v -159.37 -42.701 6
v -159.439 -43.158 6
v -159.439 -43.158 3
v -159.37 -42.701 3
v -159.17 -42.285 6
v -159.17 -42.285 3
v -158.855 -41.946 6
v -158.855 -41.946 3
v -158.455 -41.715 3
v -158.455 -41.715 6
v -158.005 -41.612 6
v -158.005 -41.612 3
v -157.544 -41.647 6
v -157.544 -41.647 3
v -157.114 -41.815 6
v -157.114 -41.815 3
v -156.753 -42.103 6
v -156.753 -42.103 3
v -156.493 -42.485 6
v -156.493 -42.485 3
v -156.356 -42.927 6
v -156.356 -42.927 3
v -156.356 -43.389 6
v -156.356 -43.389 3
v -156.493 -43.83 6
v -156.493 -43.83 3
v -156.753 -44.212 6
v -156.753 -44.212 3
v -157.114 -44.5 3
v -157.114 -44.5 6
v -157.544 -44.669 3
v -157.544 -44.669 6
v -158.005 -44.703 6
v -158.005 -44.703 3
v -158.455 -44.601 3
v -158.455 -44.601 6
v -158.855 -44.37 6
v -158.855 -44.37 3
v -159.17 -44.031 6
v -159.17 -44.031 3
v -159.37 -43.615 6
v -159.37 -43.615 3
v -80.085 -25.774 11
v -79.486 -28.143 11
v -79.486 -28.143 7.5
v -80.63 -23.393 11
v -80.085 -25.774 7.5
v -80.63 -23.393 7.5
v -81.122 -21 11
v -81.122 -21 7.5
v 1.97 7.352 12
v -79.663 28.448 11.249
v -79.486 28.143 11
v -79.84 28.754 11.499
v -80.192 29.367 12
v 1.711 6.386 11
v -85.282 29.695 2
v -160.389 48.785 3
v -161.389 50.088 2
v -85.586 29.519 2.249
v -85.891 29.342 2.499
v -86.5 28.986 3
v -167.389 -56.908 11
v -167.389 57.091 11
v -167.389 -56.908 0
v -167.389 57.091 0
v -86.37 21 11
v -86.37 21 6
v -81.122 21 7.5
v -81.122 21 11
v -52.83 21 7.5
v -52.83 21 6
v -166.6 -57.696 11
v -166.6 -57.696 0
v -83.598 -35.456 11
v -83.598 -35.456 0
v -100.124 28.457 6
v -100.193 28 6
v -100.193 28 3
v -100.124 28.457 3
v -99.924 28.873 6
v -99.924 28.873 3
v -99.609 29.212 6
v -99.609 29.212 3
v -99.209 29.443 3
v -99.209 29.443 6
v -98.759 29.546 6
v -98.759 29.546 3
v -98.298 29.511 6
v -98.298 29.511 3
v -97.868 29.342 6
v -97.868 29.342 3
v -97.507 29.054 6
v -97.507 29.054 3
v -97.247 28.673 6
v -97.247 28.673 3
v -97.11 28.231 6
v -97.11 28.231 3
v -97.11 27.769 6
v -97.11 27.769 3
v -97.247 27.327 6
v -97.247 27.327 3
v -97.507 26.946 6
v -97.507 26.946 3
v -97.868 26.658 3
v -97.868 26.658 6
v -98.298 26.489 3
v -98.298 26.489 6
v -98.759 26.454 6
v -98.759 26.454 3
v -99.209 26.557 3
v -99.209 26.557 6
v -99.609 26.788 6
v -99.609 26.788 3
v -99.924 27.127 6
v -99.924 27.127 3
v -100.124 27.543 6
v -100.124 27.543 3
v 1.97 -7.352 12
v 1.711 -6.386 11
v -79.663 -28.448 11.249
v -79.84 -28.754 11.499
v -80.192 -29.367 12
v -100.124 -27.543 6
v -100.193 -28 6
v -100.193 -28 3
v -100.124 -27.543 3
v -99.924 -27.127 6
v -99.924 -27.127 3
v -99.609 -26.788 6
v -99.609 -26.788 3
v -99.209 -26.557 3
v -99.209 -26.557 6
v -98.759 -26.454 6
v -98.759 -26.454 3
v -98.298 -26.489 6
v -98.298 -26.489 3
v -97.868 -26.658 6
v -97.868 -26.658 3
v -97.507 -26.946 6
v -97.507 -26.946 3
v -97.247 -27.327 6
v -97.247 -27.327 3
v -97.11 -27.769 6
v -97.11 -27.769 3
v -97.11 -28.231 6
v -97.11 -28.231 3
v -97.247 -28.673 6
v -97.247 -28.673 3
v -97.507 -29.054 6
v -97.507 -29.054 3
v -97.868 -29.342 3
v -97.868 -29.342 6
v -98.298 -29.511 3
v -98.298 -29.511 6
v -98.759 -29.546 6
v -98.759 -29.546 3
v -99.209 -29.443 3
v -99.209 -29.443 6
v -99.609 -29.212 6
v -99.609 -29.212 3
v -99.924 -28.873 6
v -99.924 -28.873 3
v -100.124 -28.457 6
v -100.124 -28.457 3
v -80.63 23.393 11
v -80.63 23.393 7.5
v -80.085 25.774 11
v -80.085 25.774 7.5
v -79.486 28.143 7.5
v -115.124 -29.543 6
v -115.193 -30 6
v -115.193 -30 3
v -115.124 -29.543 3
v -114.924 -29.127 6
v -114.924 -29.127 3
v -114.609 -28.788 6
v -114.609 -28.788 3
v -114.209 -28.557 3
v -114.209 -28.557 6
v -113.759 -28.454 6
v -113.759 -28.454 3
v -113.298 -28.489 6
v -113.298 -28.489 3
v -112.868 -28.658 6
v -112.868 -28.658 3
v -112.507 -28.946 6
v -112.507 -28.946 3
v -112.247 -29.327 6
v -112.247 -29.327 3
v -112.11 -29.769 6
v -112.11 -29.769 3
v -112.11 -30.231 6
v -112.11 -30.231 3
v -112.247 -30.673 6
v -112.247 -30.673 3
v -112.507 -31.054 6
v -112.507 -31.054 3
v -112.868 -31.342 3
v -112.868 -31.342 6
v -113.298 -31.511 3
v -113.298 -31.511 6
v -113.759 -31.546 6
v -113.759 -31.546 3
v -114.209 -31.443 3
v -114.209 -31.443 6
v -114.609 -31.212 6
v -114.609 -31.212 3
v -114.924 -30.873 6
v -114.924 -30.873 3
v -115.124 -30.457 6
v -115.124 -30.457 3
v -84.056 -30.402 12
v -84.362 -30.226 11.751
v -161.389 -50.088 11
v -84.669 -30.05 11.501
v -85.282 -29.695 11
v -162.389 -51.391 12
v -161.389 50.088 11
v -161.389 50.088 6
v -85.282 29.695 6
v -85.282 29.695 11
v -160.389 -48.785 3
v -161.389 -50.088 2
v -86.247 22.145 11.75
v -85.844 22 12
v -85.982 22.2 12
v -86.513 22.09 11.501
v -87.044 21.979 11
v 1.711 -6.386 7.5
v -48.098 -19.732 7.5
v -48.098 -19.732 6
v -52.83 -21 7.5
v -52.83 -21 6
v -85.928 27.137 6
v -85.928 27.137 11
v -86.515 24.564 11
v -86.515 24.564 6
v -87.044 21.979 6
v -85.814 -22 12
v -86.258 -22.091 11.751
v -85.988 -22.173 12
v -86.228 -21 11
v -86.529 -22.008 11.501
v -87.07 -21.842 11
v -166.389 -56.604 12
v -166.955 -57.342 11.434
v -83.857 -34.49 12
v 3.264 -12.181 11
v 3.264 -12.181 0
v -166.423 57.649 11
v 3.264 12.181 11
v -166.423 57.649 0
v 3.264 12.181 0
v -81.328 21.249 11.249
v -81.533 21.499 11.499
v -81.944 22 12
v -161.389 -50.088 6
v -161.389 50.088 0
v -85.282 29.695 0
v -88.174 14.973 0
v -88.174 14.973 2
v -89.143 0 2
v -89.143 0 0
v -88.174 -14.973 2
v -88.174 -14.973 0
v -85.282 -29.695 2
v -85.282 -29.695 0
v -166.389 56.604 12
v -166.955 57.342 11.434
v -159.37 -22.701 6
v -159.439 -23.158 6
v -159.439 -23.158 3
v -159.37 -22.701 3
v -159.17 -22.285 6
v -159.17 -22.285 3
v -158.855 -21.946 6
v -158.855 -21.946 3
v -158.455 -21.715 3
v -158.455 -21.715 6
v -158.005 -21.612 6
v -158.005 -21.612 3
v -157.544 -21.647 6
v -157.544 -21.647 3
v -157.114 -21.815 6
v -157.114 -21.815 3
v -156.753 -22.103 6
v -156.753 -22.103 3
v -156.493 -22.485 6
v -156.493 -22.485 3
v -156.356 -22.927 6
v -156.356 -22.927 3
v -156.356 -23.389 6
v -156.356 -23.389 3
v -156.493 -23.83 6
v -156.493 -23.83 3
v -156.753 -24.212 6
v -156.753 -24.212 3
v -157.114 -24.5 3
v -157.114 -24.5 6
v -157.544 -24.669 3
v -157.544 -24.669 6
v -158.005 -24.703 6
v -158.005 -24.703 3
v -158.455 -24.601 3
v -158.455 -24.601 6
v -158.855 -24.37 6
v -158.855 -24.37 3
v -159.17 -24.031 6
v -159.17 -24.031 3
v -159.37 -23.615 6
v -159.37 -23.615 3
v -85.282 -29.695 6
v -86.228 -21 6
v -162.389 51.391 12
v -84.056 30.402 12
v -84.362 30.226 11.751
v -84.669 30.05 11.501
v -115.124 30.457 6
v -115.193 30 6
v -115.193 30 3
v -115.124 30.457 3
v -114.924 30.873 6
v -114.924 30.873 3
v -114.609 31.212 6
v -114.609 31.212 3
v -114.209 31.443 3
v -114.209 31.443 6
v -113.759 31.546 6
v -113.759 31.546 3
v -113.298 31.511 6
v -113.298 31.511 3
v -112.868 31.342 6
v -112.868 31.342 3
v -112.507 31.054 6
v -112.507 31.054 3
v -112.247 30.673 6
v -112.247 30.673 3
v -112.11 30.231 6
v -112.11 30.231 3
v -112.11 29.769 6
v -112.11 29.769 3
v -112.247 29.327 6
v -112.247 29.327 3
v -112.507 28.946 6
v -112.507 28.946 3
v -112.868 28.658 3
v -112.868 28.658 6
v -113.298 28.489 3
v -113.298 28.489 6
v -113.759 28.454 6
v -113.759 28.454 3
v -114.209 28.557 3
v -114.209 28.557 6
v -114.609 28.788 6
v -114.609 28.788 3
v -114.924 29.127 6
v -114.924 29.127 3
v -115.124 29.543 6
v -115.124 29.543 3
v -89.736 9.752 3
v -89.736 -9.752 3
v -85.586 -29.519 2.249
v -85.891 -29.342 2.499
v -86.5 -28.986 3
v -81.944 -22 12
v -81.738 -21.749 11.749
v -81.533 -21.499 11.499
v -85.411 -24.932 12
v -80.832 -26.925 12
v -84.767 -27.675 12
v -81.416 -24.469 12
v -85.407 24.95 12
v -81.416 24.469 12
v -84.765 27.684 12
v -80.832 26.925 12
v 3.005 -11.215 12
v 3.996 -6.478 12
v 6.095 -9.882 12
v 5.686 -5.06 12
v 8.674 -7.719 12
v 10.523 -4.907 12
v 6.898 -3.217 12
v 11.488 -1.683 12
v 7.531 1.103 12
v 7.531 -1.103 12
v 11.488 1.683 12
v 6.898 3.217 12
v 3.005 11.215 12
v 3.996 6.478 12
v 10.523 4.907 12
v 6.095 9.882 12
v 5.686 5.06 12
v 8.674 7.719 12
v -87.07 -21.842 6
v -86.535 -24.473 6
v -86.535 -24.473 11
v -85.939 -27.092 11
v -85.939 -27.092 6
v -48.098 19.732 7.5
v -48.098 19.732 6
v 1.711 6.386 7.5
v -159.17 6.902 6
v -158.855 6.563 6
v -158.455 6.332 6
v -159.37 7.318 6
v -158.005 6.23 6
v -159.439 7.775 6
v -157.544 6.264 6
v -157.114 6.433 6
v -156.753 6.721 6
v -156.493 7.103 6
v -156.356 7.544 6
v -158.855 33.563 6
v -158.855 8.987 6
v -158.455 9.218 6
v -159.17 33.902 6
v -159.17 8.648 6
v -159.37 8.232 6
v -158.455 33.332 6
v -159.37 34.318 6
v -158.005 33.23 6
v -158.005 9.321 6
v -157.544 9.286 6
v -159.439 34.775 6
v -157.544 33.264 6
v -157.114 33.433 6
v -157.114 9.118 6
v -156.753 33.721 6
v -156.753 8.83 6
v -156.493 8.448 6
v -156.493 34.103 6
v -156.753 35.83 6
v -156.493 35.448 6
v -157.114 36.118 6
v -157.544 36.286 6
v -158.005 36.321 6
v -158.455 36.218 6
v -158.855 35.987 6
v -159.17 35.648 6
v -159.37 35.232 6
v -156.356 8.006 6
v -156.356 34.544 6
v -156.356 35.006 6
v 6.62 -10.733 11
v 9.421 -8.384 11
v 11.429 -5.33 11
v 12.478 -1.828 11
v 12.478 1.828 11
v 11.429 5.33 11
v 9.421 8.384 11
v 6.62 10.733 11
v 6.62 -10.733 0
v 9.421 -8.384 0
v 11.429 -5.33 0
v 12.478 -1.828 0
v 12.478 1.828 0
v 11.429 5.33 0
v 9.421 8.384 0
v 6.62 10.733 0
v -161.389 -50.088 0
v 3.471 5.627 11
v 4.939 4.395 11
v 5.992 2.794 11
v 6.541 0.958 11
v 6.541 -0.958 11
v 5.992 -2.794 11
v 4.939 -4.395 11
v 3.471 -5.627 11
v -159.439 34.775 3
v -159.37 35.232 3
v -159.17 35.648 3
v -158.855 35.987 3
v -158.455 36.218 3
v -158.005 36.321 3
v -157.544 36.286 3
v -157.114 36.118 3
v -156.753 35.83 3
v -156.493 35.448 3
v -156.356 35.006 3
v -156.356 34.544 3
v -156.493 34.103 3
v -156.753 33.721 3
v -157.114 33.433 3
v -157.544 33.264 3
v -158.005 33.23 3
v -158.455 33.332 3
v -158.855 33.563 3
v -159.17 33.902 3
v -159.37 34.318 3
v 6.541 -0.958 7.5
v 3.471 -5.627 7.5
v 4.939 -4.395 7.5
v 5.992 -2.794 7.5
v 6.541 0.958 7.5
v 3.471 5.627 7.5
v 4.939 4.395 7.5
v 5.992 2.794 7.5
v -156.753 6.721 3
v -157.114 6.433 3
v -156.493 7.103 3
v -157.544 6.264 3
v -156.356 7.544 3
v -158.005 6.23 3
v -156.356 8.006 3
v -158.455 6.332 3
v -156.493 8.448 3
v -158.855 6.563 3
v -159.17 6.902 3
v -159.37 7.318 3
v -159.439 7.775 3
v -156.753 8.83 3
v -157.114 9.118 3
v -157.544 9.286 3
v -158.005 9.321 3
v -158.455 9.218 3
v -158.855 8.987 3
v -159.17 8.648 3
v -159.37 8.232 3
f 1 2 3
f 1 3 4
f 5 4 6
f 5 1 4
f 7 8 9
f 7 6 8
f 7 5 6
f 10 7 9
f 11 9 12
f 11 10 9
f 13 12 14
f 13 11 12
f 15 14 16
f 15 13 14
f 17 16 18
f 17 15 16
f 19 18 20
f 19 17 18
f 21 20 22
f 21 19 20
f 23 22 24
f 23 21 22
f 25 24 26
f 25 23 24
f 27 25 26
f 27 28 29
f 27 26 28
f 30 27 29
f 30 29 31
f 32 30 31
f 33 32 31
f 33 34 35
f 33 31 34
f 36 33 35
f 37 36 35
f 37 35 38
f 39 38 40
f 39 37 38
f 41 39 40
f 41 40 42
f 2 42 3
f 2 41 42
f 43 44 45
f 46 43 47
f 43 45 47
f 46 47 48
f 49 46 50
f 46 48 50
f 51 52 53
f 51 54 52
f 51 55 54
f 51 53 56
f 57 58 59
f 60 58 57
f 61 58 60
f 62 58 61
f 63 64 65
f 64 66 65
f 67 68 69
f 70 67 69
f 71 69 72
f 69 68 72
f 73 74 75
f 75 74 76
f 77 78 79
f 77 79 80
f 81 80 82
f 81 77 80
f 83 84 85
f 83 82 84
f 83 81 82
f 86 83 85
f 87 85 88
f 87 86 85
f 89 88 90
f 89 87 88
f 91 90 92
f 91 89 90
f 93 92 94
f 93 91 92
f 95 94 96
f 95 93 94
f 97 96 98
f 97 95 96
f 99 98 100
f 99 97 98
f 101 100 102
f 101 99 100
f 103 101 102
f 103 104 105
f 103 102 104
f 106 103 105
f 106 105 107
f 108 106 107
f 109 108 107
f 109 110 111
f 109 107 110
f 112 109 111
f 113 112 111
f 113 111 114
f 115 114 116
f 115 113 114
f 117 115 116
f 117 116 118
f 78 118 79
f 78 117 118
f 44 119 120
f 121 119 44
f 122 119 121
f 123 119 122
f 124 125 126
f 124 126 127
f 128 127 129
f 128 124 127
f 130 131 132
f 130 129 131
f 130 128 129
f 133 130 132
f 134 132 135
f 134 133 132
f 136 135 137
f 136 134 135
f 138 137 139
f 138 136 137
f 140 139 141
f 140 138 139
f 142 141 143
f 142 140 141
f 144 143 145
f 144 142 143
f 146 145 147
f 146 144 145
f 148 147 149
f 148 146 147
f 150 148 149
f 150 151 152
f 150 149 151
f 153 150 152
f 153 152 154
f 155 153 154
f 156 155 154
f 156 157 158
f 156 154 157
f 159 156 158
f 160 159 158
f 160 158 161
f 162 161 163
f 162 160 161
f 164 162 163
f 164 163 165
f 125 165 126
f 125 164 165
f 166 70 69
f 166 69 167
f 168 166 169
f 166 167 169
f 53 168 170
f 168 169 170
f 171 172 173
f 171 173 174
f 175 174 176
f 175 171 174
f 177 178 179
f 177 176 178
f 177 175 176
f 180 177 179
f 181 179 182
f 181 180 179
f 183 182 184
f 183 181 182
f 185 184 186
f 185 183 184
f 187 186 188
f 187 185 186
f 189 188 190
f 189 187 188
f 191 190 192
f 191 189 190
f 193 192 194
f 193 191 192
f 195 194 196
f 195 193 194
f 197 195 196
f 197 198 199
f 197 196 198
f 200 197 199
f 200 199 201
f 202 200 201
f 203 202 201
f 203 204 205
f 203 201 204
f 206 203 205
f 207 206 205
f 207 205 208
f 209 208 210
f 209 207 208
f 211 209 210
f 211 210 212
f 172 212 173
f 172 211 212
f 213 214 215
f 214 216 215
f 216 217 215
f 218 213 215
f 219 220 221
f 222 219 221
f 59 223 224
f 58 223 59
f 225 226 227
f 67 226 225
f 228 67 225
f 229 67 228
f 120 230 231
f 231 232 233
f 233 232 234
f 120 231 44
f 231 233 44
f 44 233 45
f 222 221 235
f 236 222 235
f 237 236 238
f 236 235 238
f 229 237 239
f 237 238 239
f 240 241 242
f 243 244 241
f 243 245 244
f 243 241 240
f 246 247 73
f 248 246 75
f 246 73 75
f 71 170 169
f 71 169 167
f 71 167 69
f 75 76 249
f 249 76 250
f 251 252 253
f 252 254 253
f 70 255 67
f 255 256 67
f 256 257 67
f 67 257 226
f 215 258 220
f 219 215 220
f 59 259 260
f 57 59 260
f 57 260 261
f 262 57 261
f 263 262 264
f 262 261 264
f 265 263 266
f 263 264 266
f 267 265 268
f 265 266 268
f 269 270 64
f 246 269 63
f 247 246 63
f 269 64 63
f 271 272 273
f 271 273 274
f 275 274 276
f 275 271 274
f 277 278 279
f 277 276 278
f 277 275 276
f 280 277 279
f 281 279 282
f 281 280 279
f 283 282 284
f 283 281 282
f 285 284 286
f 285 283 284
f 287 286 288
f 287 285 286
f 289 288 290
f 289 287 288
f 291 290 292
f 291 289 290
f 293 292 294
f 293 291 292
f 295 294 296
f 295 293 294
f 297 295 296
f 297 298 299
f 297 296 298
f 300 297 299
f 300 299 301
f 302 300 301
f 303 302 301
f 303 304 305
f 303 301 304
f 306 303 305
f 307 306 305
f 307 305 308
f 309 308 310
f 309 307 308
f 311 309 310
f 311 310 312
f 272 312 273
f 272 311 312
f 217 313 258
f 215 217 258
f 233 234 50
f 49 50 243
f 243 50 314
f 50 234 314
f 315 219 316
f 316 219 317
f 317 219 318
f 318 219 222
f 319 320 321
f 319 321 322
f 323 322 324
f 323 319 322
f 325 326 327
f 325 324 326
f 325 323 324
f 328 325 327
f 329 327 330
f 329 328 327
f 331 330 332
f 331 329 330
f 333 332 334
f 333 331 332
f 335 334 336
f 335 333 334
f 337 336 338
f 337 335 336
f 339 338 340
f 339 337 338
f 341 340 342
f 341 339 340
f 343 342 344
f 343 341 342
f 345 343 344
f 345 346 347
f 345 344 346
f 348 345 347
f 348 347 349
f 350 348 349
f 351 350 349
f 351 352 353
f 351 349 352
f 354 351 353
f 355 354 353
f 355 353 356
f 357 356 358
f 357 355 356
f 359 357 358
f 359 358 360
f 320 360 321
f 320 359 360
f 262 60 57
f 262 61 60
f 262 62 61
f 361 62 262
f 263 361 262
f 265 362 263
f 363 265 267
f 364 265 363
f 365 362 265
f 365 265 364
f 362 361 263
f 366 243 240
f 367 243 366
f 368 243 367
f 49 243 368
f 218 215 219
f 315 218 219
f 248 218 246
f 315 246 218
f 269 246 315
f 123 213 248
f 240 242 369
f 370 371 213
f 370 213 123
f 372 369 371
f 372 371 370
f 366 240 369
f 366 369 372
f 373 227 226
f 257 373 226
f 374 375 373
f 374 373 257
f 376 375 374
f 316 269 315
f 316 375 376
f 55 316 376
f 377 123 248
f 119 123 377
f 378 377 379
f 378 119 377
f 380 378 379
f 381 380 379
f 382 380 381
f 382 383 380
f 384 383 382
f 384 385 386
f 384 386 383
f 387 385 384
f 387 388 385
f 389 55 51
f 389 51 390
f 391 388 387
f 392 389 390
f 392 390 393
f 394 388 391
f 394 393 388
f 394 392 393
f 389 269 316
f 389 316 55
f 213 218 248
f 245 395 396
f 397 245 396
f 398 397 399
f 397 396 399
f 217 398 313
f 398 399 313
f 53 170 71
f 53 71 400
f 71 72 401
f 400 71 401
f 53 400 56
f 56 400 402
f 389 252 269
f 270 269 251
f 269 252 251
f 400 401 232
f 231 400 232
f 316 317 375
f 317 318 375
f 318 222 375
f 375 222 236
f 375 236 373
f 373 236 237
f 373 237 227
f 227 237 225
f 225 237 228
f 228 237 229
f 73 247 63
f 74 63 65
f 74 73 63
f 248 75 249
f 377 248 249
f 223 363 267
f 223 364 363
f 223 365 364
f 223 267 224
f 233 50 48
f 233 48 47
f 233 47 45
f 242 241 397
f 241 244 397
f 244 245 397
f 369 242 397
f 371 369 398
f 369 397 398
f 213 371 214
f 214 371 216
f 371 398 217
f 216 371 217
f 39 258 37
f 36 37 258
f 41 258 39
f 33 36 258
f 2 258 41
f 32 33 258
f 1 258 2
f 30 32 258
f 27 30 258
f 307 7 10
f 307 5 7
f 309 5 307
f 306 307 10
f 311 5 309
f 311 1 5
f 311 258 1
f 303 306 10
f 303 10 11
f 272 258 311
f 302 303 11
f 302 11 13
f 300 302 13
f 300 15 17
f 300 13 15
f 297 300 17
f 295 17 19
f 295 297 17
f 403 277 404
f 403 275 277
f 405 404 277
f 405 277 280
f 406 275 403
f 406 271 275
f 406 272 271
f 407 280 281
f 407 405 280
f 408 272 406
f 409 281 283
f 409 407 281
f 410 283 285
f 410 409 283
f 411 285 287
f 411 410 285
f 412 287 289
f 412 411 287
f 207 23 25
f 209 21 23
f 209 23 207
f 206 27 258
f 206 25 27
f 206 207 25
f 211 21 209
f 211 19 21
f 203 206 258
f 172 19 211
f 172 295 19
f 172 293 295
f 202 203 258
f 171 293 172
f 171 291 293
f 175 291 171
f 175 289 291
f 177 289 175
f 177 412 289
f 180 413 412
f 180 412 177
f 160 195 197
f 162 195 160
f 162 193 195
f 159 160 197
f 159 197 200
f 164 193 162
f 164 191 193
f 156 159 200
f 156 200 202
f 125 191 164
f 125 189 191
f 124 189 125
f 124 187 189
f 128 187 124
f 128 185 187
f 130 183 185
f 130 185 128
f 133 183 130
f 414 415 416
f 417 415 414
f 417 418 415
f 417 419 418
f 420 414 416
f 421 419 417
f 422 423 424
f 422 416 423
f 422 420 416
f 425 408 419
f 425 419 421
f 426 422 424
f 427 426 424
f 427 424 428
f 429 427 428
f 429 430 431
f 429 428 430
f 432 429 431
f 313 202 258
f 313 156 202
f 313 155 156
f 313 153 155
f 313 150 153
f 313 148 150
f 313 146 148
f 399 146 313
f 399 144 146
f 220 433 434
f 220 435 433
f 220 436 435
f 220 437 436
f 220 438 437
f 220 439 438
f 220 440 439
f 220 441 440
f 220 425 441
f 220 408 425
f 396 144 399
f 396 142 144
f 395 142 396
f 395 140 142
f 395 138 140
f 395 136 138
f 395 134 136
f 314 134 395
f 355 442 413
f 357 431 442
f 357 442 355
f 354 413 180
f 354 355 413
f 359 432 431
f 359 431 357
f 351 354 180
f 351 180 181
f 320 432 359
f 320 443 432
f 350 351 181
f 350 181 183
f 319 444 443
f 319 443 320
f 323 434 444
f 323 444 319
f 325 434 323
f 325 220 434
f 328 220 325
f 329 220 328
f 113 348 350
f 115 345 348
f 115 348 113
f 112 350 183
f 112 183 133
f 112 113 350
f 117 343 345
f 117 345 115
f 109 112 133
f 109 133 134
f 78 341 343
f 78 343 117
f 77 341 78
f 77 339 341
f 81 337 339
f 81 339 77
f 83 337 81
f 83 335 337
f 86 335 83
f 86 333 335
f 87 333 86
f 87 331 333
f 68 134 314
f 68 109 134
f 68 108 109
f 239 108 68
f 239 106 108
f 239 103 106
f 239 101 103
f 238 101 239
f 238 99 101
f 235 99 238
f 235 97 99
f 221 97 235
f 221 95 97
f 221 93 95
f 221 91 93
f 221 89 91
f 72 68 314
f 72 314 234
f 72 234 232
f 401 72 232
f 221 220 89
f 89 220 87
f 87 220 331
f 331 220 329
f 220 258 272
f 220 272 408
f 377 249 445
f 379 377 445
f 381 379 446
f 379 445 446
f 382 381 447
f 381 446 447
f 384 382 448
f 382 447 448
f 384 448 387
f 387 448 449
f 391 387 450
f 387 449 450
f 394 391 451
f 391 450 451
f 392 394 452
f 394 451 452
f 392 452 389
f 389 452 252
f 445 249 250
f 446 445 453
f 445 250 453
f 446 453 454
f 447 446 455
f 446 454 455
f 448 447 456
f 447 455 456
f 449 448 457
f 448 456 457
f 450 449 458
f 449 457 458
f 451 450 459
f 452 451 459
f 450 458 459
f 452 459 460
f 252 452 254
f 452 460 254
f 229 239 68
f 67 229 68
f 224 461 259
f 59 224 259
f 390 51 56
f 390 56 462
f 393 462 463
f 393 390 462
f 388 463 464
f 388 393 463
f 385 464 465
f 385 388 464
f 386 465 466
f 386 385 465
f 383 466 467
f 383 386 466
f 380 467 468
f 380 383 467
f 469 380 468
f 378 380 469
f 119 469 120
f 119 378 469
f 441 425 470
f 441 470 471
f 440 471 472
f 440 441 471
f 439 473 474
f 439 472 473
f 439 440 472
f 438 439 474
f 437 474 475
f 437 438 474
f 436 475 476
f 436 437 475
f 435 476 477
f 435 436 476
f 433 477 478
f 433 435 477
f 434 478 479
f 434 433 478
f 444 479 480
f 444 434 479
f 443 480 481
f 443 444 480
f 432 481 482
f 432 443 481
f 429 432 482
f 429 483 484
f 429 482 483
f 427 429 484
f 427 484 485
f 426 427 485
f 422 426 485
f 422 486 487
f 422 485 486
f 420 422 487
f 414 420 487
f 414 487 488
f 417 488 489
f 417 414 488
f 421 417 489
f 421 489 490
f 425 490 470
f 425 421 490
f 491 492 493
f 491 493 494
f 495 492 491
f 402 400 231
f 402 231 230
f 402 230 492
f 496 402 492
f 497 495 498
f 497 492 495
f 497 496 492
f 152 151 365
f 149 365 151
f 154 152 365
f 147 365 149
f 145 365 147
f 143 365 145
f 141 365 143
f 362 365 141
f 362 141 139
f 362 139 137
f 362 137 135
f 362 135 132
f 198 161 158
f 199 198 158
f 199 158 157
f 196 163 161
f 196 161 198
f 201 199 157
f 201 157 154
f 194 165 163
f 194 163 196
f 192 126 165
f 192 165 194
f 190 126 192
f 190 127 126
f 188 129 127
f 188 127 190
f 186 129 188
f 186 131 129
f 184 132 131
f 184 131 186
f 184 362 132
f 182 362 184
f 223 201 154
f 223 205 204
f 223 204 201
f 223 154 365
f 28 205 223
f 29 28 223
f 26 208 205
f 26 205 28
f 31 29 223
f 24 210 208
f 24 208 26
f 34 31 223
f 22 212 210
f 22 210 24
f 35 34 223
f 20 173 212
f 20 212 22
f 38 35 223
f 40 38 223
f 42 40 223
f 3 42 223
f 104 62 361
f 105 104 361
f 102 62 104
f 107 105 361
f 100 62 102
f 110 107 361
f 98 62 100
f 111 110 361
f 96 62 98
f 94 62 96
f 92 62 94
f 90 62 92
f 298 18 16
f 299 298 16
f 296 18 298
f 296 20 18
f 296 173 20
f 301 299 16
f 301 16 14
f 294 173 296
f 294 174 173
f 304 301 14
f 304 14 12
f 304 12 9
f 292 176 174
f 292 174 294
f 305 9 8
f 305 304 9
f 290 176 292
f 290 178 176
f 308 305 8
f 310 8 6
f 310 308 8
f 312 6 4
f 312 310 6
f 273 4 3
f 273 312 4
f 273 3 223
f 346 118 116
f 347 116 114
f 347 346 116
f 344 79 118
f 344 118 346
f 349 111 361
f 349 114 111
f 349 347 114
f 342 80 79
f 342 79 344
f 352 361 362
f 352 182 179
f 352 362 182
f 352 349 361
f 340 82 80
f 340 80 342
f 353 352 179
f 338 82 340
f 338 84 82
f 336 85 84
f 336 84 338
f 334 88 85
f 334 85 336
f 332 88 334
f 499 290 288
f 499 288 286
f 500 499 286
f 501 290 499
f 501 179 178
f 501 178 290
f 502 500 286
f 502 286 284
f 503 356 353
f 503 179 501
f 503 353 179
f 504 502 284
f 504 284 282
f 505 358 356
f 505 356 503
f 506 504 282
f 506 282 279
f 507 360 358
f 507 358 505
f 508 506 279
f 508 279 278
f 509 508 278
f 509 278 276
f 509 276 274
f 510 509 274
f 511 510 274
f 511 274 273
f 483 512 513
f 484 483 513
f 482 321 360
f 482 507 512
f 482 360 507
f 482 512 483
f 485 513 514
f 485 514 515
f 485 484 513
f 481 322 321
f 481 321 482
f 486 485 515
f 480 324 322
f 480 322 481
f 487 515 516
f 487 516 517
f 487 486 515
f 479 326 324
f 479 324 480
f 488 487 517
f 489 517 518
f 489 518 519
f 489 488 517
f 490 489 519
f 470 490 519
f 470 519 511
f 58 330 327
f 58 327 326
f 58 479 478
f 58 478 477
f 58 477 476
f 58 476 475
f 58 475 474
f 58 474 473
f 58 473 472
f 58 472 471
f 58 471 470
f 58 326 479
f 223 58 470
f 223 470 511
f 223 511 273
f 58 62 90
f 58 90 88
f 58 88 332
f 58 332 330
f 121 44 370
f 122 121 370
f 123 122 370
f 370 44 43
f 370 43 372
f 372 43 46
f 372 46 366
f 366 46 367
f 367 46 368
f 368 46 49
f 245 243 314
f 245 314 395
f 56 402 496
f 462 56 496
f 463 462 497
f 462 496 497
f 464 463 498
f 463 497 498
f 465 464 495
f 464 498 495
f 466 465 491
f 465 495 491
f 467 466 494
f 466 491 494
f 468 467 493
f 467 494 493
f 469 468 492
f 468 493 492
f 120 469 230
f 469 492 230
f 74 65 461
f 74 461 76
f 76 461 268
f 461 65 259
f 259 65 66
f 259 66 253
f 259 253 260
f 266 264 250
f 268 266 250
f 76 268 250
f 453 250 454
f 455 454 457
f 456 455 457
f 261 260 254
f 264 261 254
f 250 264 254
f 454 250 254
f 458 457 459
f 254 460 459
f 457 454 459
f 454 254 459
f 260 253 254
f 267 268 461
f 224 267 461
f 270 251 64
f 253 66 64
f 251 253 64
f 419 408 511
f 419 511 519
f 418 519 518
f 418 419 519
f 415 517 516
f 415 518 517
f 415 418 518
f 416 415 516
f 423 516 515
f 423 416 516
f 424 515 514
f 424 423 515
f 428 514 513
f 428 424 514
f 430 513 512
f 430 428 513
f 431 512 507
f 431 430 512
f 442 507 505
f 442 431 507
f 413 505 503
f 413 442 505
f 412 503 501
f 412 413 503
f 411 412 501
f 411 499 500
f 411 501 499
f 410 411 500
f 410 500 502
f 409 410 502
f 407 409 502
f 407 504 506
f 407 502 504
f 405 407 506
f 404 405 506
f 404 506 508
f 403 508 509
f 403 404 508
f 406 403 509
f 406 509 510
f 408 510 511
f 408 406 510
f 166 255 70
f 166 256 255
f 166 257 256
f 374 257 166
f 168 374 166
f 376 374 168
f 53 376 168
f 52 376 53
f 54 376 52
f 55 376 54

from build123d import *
from OCP.BRepFilletAPI import BRepFilletAPI_MakeChamfer

# Parameters (mm, degrees)
BOSS_EXTRUDE1_DEPTH     = 6
BOSS_EXTRUDE2_START     = 6
BOSS_EXTRUDE2_DEPTH     = 6
BOSS_EXTRUDE3_DEPTH     = 1.5
CUT_EXTRUDE3_DEPTH      = 6
CHAMFER1_SIZE           = 0.858848527
CHAMFER1_SIZE_2         = 1
CHAMFER2_SIZE           = 1
CHAMFER3_SIZE           = 1
CHAMFER3_SIZE2          = 0.816496581
CUT_EXTRUDE4_DEPTH      = 3
CHAMFER4_SIZE           = 1
CUT_EXTRUDE5_DEPTH      = 178.282114668
CUT_EXTRUDE5_DEPTH_BACK = 178.282114668
SKETCH8_R               = 1.55


with BuildPart() as part:
    # Sketch3 → Boss-Extrude1 (new body)
    with BuildSketch(Plane.XY):
        with BuildLine():
            Line((3.263957589, 12.181255556), (-167.389036276, 57.907587448))
            Line((-167.389036276, 57.907587448), (-167.389036276, -57.907587448))
            Line((-167.389036276, -57.907587448), (-83.597968128, -35.455838404))
            Line((-83.597968128, -35.455838404), (3.263957589, -12.181255556))
            ThreePointArc((3.263957589, -12.181255556), (12.610963724, 0), (3.263957589, 12.181255556))
        make_face()
    extrude(amount=BOSS_EXTRUDE1_DEPTH)

    # Sketch3<3> → Boss-Extrude2 (add)
    with BuildSketch(Plane.XY.offset(BOSS_EXTRUDE2_START)):
        with BuildLine():
            ThreePointArc((3.263957589, -12.181255556), (12.610963724, 0), (3.263957589, 12.181255556))
            Line((3.263957589, 12.181255556), (-167.389036276, 57.907587448))
            Line((-167.389036276, 57.907587448), (-167.389036276, -57.907587448))
            Line((-167.389036276, -57.907587448), (-83.597968128, -35.455838404))
            Line((-83.597968128, -35.455838404), (3.263957589, -12.181255556))
        make_face()
        with BuildLine():
            Line((1.711043318, -6.385700598), (-79.486479098, -28.142511157))
            ThreePointArc((-79.486479098, -28.142511157), (-83.143036276, 0), (-79.486479098, 28.142511157))
            Line((-79.486479098, 28.142511157), (1.711043318, 6.385700598))
            ThreePointArc((1.711043318, 6.385700598), (6.610963724, 0), (1.711043318, -6.385700598))
        make_face(mode=Mode.SUBTRACT)
        with BuildLine():
            Line((-85.282065581, -29.695433875), (-161.389036276, -50.088235211))
            Line((-161.389036276, -50.088235211), (-161.389036276, 50.088235211))
            Line((-161.389036276, 50.088235211), (-85.282065581, 29.695433875))
            ThreePointArc((-85.282065581, 29.695433875), (-89.143036276, 0), (-85.282065581, -29.695433875))
        make_face(mode=Mode.SUBTRACT)
    extrude(amount=BOSS_EXTRUDE2_DEPTH)

    # Sketch4 → Boss-Extrude3 (add)
    with BuildSketch(Plane.XY.offset(6)):
        with BuildLine():
            ThreePointArc((-79.486479098, 28.142511157), (-80.363791639, 24.584864194), (-81.12226241, 21))
            Line((-81.12226241, 21), (-52.830264568, 21))
            Line((-52.830264568, 21), (-79.486479098, 28.142511157))
        make_face()
        with BuildLine():
            Line((-79.486479098, -28.142511157), (-52.830264568, -21))
            Line((-52.830264568, -21), (-81.12226241, -21))
            ThreePointArc((-81.12226241, -21), (-80.363791639, -24.584864194), (-79.486479098, -28.142511157))
        make_face()
        with BuildLine():
            Line((-48.09821376, 19.732050808), (-48.09821376, -19.732050808))
            Line((-48.09821376, -19.732050808), (1.711043318, -6.385700598))
            ThreePointArc((1.711043318, -6.385700598), (6.610963724, 0), (1.711043318, 6.385700598))
            Line((1.711043318, 6.385700598), (-48.09821376, 19.732050808))
        make_face()
    extrude(amount=BOSS_EXTRUDE3_DEPTH)

    # Sketch5 → Cut-Extrude3 (cut)
    with BuildSketch(Plane.XY.offset(6)):
        with BuildLine():
            Line((-81.12226241, 21), (-87.228470489, 21))
            ThreePointArc((-87.228470489, 21), (-89.143036276, 0), (-87.228470489, -21))
            Line((-87.228470489, -21), (-81.12226241, -21))
            ThreePointArc((-81.12226241, -21), (-83.143036276, 0), (-81.12226241, 21))
        make_face()
    extrude(amount=CUT_EXTRUDE3_DEPTH, mode=Mode.SUBTRACT)

    # Chamfer1
    # the kernel refuses this chamfer: 1, 0.858848527 mm, written as the material it takes off along each edge
    with BuildSketch(Plane(origin=(-87.228470489, 21, 6), x_dir=(0.1850514416549976, 0.9827288354075131, 0), z_dir=(0, 0, 1))) as chamfer1_piece_1:
        with BuildLine():
            Line((0.995740125, 0), (CHAMFER1_SIZE * 0.185051441724, -CHAMFER1_SIZE * 0.982728835776))
            Line((CHAMFER1_SIZE * 0.185051441724, -CHAMFER1_SIZE * 0.982728835776), (0, 0))
            ThreePointArc((0, 0), (0.511949844, 0.001066408), (0.995740125, 0))
        make_face()
    extrude(amount=8.560742024, mode=Mode.SUBTRACT)
    with BuildSketch(Plane(origin=(-87.228470489, -21, 6), x_dir=(1, 0, 0), z_dir=(0, 0, 1))) as chamfer1_piece_2:
        with BuildLine():
            Line((CHAMFER1_SIZE_2, 0), (0.158025015, -0.841974985))
            ThreePointArc((0.158025015, -0.841974985), (0.080319075, -0.432228603), (0, 0))
            Line((0, 0), (CHAMFER1_SIZE_2, 0))
        make_face()
    extrude(amount=8.571682988, mode=Mode.SUBTRACT)

    # Chamfer2
    chamfer2_edges = [part.edges().sort_by_distance(p)[0] for p in [
        (-86.244364999, -25.784214234, 12),
        (-83.67536645, -21, 12),
        (-86.706914653, 21.489271267, 12),
        (-86.649457982, -21.420987493, 12),
        (-82.062539343, -35.044421502, 12),
        (12.610963724, 0, 12),
        (-161.389036276, 0, 12),
        (-86.228906055, 25.852006602, 12),
        (-123.335550929, -39.891834543, 12),
        (-38.88771789, 17.264105877, 12),
        (-38.88771789, -17.264105877, 12),
        (-82.062539343, 35.044421502, 12),
        (-167.389036276, 0, 12),
        (-123.335550929, 39.891834543, 12),
        (6.610963724, 0, 12),
        (-80.363791639, 24.584864194, 12),
        (-80.363791639, -24.584864194, 12),
        (-83.745942186, 21, 12),
    ]]
    chamfer(chamfer2_edges, length=CHAMFER2_SIZE)

    # Chamfer3: one chamfer whose edges measure the first distance from different faces: ONE call of the kernel's chamfer builder (chamfer() names one face for all edges)
    chamfer3_edges_1 = [part.edges().sort_by_distance(p)[0] for p in [
        (-167.389036276, -57.907587448, 5.5),
    ]]
    chamfer3_side_1 = [part.faces().sort_by_distance(p)[0] for p in [
        (-167.389036276, 0, 5.5),
    ]]
    chamfer3_edges_2 = [part.edges().sort_by_distance(p)[0] for p in [
        (-167.389036276, 57.907587448, 5.5),
    ]]
    chamfer3_side_2 = [part.faces().sort_by_distance(p)[0] for p in [
        (-82.062539343, 35.044421502, 5.5),
    ]]
    chamfer3 = BRepFilletAPI_MakeChamfer(part.part.solid().wrapped)
    for e in chamfer3_edges_1:
        chamfer3.Add(CHAMFER3_SIZE, CHAMFER3_SIZE2, e.wrapped, chamfer3_side_1[0].wrapped)  # the first distance lies on this face
    for e in chamfer3_edges_2:
        chamfer3.Add(CHAMFER3_SIZE, CHAMFER3_SIZE2, e.wrapped, chamfer3_side_2[0].wrapped)  # the first distance lies on this face
    add(Compound.cast(chamfer3.Shape()), mode=Mode.REPLACE)

    # Sketch7 → Cut-Extrude4 (cut)
    with BuildSketch(Plane(origin=(0, 0, 0), x_dir=(-1, 0, 0), z_dir=(0, 0, -1))):
        with BuildLine():
            Line((161.389036276, 50.088235211), (85.282065581, 29.695433875))
            ThreePointArc((85.282065581, 29.695433875), (89.143036276, 0), (85.282065581, -29.695433875))
            Line((85.282065581, -29.695433875), (161.389036276, -50.088235211))
            Line((161.389036276, -50.088235211), (161.389036276, 50.088235211))
        make_face()
    extrude(amount=-CUT_EXTRUDE4_DEPTH, mode=Mode.SUBTRACT)

    # Chamfer4
    chamfer4_edges = [part.edges().sort_by_distance(p)[0] for p in [
        (-89.143036276, 0, 3),
        (-123.335550929, 39.891834543, 3),
        (-161.389036276, 0, 3),
        (-123.335550929, -39.891834543, 3),
    ]]
    chamfer(chamfer4_edges, length=CHAMFER4_SIZE)

    # Sketch8 → Cut-Extrude5 (cut, two sides: drawn at the far end of the back side and taken through both)
    with BuildSketch(Plane(origin=(0, 0, 3), x_dir=(-1, 0, 0), z_dir=(0, 0, -1)).offset(-CUT_EXTRUDE5_DEPTH_BACK)):
        with Locations((157.889036276, 34.775263876)):
            Circle(SKETCH8_R)
        with Locations((157.889036276, 7.775263876)):
            Circle(SKETCH8_R)
        with Locations((157.889036276, -23.157763876)):
            Circle(SKETCH8_R)
        with Locations((157.889036276, -43.157763876)):
            Circle(SKETCH8_R)
        with Locations((98.643036276, 28)):
            Circle(SKETCH8_R)
        with Locations((113.643036276, 30)):
            Circle(SKETCH8_R)
        with Locations((98.643036276, -28)):
            Circle(SKETCH8_R)
        with Locations((113.643036276, -30)):
            Circle(SKETCH8_R)
    extrude(amount=CUT_EXTRUDE5_DEPTH + CUT_EXTRUDE5_DEPTH_BACK, mode=Mode.SUBTRACT)


solid = part.part
